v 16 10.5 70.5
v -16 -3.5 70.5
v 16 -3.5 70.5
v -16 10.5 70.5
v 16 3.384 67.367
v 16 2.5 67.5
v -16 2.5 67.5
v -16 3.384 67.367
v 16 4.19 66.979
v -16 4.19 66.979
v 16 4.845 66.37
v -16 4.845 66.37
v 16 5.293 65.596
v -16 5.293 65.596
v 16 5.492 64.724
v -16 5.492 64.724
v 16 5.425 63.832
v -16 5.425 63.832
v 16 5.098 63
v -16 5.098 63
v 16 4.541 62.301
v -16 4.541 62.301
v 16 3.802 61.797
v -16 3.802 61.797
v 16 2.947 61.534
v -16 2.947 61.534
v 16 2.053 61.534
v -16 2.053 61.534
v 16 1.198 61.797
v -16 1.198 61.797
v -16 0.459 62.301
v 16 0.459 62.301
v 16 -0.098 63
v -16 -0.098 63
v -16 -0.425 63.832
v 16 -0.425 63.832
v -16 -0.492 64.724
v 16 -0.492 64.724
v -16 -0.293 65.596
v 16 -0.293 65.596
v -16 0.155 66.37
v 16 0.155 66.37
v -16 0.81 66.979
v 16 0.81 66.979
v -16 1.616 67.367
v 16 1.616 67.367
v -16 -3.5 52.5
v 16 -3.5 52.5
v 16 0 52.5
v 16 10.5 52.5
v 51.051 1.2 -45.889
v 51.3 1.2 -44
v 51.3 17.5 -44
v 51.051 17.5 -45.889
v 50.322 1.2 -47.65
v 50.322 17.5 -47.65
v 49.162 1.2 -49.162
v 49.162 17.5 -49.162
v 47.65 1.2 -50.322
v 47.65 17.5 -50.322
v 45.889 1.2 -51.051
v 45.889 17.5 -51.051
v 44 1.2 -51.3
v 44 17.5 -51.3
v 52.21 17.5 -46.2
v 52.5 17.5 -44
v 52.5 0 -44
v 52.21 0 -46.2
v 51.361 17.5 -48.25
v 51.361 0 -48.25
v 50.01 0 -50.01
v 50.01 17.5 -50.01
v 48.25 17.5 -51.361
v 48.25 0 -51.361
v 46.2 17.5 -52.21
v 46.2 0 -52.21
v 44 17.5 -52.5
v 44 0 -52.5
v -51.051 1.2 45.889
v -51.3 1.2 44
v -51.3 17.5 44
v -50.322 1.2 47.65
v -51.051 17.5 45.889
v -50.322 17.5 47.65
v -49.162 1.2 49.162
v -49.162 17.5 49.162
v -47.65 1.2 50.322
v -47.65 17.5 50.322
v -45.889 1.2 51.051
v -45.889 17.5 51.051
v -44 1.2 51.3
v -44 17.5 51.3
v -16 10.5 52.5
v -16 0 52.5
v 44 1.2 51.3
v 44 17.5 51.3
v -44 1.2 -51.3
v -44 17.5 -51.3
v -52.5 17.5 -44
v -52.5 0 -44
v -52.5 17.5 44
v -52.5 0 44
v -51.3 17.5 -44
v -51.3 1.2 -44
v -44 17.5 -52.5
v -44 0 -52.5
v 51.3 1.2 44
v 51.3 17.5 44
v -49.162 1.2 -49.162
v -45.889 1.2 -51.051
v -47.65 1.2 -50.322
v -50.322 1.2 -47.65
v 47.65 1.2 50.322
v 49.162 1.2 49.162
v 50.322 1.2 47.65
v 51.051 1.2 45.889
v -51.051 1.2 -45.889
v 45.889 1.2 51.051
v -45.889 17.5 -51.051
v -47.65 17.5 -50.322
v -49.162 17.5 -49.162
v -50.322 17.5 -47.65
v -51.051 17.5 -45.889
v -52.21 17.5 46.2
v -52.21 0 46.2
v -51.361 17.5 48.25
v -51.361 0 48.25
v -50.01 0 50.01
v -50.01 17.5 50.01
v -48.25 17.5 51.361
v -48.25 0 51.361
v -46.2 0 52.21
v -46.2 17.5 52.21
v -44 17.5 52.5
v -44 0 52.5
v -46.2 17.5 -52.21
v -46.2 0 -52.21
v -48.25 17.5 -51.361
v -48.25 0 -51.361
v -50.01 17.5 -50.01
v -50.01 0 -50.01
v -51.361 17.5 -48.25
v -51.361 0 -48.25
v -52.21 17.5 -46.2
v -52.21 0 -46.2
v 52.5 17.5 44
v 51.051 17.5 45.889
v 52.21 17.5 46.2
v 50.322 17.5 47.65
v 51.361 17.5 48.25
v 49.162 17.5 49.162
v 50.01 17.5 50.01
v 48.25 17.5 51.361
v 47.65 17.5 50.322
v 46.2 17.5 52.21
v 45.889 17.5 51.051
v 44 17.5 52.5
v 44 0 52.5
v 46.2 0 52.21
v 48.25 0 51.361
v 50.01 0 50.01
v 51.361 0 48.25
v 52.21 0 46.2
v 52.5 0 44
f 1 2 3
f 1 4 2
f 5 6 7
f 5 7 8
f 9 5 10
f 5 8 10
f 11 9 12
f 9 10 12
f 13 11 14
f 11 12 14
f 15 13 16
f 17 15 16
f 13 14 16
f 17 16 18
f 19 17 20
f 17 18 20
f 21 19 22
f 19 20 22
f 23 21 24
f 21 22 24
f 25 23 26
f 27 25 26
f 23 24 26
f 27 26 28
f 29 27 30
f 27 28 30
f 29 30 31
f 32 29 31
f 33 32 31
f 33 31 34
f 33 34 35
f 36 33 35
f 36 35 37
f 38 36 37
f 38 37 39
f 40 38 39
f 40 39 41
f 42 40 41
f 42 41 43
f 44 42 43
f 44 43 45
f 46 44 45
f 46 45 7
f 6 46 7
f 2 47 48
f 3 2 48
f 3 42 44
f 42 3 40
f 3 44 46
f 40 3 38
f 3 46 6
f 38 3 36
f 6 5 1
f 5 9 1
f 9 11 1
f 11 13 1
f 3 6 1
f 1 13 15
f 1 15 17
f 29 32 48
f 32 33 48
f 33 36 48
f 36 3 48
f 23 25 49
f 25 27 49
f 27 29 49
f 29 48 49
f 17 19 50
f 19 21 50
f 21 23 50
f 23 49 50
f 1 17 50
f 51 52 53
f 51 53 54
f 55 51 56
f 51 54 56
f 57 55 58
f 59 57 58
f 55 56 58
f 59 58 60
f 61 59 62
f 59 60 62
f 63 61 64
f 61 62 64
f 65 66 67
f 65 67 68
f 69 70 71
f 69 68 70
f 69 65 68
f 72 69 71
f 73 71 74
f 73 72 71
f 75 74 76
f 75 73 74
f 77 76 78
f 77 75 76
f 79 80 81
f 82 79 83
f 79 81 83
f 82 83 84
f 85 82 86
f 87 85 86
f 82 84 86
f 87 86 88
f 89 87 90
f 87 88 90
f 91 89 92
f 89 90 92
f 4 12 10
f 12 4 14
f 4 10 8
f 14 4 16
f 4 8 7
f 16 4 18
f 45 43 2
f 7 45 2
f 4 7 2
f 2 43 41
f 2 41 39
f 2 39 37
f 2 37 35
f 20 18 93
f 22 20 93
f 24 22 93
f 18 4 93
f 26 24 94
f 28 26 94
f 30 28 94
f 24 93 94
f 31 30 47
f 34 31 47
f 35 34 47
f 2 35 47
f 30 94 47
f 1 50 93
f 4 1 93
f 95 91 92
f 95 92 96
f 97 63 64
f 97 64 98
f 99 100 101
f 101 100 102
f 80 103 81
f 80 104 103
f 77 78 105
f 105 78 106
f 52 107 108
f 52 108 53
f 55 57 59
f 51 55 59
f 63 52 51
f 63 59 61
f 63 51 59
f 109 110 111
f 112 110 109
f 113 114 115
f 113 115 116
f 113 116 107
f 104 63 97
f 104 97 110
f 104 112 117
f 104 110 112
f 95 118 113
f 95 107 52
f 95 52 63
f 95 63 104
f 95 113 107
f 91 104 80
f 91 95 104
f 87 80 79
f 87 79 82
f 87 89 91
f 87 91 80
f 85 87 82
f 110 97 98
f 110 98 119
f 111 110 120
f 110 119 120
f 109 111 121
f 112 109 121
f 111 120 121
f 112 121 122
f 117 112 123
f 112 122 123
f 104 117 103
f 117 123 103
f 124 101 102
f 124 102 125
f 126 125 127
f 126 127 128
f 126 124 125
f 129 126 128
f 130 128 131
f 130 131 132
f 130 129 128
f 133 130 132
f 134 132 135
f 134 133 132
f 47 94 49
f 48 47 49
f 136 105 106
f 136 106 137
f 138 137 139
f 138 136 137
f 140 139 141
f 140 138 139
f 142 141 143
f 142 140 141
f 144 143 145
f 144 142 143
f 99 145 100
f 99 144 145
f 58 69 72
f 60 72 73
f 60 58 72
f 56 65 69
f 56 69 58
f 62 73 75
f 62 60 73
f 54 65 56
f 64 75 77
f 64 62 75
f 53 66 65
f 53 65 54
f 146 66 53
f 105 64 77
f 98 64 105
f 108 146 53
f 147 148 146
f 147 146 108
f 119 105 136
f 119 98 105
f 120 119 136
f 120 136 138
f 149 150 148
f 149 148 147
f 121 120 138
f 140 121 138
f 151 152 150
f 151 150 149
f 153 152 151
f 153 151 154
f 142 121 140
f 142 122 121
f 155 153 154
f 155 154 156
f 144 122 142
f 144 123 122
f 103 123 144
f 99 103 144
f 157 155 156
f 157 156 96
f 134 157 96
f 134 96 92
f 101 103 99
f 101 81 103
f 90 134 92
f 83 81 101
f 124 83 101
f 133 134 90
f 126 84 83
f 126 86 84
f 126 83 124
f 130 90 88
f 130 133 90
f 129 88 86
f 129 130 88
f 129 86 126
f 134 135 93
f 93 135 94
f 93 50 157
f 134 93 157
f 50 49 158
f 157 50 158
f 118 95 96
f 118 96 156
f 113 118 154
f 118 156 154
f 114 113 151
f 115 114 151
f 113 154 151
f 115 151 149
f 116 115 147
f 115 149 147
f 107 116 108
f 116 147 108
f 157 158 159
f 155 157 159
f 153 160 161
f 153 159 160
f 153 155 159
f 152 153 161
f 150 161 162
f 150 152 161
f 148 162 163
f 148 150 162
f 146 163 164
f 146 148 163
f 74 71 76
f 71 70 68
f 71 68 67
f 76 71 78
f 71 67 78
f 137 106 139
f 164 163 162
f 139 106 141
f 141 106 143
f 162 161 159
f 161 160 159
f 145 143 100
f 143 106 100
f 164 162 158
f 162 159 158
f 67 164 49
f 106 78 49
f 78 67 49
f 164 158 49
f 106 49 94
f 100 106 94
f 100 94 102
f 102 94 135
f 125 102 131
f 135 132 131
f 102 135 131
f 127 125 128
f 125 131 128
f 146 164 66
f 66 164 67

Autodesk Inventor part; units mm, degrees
ref_plane "YZ Plane" through (0, 0, 0) normal (1, 0, 0) x (0, 1, 0)
ref_plane "XZ Plane" through (0, 0, 0) normal (0, 1, 0) x (-1, 0, 0)
ref_plane "XY Plane" through (0, 0, 0) normal (0, 0, 1) x (1, 0, 0)
sketch "Szkic1" plane through (0, 0, 0) normal (0, 1, 0) x (-1, 0, 0)
  line L0 (52.5, 52.5) -> (-52.5, 52.5)
  line L1 (-52.5, 52.5) -> (-52.5, -52.5)
  line L2 (-52.5, -52.5) -> (52.5, -52.5)
  line L3 (52.5, -52.5) -> (52.5, 52.5)
  point P0 (0, 0)
  dimension "d0" = 105
  dimension "d1" = 105
  dimension "d2" = 52.5
  dimension "d3" = 52.5
extrude "Wyciągnięcie proste1" add sketch "Szkic1" along normal blind 17.5
fillet "Zaokrąglenie1" radius 8.5 4 edges at (52.5, 8.75, 52.5) (-52.5, 8.75, 52.5) (52.5, 8.75, -52.5) (-52.5, 8.75, -52.5)
shell "Skorupa1" thickness 1.2 removed faces 1 at (-20.3333, 17.5, -17.5)
sketch "Szkic4" plane through (-44, 0, 52.5) normal (0, 0, 1) x (1, 0, 0)
  line L0 (0, 0) -> (88, 0) projected
  line L1 (28, -3.5) -> (60, -3.5)
  line L2 (60, -3.5) -> (60, 10.5)
  line L3 (60, 10.5) -> (28, 10.5)
  line L4 (28, 10.5) -> (28, -3.5)
  line L5 (0, 17.5) -> (88, 17.5) projected
  point P0 (60, 0)
  point P1 (44, 0)
  point P2 (44, 17.5)
  dimension "d21" = 32
  dimension "d22" = 16
  dimension "d23" = 21
  dimension "d24" = 14
extrude "Wyciągnięcie proste4" add sketch "Szkic4" along normal blind 18
sketch "Szkic6" plane through (-16, -3.5, 52.5) normal (-1, 0, 0) x (0, 0, 1)
  circle A0 centre (12, 6) radius 3
  line L0 (0, 3.5) -> (0, 21) projected
  line L1 (0, 0) -> (18, 0) projected
  point P0 (-52.5, 3.5)
  dimension "d29" = 6
  dimension "d30" = 12
  dimension "d31" = 3
extrude "Wyciągnięcie proste6" cut sketch "Szkic6" against normal blind 50
properties part number "lampa"
